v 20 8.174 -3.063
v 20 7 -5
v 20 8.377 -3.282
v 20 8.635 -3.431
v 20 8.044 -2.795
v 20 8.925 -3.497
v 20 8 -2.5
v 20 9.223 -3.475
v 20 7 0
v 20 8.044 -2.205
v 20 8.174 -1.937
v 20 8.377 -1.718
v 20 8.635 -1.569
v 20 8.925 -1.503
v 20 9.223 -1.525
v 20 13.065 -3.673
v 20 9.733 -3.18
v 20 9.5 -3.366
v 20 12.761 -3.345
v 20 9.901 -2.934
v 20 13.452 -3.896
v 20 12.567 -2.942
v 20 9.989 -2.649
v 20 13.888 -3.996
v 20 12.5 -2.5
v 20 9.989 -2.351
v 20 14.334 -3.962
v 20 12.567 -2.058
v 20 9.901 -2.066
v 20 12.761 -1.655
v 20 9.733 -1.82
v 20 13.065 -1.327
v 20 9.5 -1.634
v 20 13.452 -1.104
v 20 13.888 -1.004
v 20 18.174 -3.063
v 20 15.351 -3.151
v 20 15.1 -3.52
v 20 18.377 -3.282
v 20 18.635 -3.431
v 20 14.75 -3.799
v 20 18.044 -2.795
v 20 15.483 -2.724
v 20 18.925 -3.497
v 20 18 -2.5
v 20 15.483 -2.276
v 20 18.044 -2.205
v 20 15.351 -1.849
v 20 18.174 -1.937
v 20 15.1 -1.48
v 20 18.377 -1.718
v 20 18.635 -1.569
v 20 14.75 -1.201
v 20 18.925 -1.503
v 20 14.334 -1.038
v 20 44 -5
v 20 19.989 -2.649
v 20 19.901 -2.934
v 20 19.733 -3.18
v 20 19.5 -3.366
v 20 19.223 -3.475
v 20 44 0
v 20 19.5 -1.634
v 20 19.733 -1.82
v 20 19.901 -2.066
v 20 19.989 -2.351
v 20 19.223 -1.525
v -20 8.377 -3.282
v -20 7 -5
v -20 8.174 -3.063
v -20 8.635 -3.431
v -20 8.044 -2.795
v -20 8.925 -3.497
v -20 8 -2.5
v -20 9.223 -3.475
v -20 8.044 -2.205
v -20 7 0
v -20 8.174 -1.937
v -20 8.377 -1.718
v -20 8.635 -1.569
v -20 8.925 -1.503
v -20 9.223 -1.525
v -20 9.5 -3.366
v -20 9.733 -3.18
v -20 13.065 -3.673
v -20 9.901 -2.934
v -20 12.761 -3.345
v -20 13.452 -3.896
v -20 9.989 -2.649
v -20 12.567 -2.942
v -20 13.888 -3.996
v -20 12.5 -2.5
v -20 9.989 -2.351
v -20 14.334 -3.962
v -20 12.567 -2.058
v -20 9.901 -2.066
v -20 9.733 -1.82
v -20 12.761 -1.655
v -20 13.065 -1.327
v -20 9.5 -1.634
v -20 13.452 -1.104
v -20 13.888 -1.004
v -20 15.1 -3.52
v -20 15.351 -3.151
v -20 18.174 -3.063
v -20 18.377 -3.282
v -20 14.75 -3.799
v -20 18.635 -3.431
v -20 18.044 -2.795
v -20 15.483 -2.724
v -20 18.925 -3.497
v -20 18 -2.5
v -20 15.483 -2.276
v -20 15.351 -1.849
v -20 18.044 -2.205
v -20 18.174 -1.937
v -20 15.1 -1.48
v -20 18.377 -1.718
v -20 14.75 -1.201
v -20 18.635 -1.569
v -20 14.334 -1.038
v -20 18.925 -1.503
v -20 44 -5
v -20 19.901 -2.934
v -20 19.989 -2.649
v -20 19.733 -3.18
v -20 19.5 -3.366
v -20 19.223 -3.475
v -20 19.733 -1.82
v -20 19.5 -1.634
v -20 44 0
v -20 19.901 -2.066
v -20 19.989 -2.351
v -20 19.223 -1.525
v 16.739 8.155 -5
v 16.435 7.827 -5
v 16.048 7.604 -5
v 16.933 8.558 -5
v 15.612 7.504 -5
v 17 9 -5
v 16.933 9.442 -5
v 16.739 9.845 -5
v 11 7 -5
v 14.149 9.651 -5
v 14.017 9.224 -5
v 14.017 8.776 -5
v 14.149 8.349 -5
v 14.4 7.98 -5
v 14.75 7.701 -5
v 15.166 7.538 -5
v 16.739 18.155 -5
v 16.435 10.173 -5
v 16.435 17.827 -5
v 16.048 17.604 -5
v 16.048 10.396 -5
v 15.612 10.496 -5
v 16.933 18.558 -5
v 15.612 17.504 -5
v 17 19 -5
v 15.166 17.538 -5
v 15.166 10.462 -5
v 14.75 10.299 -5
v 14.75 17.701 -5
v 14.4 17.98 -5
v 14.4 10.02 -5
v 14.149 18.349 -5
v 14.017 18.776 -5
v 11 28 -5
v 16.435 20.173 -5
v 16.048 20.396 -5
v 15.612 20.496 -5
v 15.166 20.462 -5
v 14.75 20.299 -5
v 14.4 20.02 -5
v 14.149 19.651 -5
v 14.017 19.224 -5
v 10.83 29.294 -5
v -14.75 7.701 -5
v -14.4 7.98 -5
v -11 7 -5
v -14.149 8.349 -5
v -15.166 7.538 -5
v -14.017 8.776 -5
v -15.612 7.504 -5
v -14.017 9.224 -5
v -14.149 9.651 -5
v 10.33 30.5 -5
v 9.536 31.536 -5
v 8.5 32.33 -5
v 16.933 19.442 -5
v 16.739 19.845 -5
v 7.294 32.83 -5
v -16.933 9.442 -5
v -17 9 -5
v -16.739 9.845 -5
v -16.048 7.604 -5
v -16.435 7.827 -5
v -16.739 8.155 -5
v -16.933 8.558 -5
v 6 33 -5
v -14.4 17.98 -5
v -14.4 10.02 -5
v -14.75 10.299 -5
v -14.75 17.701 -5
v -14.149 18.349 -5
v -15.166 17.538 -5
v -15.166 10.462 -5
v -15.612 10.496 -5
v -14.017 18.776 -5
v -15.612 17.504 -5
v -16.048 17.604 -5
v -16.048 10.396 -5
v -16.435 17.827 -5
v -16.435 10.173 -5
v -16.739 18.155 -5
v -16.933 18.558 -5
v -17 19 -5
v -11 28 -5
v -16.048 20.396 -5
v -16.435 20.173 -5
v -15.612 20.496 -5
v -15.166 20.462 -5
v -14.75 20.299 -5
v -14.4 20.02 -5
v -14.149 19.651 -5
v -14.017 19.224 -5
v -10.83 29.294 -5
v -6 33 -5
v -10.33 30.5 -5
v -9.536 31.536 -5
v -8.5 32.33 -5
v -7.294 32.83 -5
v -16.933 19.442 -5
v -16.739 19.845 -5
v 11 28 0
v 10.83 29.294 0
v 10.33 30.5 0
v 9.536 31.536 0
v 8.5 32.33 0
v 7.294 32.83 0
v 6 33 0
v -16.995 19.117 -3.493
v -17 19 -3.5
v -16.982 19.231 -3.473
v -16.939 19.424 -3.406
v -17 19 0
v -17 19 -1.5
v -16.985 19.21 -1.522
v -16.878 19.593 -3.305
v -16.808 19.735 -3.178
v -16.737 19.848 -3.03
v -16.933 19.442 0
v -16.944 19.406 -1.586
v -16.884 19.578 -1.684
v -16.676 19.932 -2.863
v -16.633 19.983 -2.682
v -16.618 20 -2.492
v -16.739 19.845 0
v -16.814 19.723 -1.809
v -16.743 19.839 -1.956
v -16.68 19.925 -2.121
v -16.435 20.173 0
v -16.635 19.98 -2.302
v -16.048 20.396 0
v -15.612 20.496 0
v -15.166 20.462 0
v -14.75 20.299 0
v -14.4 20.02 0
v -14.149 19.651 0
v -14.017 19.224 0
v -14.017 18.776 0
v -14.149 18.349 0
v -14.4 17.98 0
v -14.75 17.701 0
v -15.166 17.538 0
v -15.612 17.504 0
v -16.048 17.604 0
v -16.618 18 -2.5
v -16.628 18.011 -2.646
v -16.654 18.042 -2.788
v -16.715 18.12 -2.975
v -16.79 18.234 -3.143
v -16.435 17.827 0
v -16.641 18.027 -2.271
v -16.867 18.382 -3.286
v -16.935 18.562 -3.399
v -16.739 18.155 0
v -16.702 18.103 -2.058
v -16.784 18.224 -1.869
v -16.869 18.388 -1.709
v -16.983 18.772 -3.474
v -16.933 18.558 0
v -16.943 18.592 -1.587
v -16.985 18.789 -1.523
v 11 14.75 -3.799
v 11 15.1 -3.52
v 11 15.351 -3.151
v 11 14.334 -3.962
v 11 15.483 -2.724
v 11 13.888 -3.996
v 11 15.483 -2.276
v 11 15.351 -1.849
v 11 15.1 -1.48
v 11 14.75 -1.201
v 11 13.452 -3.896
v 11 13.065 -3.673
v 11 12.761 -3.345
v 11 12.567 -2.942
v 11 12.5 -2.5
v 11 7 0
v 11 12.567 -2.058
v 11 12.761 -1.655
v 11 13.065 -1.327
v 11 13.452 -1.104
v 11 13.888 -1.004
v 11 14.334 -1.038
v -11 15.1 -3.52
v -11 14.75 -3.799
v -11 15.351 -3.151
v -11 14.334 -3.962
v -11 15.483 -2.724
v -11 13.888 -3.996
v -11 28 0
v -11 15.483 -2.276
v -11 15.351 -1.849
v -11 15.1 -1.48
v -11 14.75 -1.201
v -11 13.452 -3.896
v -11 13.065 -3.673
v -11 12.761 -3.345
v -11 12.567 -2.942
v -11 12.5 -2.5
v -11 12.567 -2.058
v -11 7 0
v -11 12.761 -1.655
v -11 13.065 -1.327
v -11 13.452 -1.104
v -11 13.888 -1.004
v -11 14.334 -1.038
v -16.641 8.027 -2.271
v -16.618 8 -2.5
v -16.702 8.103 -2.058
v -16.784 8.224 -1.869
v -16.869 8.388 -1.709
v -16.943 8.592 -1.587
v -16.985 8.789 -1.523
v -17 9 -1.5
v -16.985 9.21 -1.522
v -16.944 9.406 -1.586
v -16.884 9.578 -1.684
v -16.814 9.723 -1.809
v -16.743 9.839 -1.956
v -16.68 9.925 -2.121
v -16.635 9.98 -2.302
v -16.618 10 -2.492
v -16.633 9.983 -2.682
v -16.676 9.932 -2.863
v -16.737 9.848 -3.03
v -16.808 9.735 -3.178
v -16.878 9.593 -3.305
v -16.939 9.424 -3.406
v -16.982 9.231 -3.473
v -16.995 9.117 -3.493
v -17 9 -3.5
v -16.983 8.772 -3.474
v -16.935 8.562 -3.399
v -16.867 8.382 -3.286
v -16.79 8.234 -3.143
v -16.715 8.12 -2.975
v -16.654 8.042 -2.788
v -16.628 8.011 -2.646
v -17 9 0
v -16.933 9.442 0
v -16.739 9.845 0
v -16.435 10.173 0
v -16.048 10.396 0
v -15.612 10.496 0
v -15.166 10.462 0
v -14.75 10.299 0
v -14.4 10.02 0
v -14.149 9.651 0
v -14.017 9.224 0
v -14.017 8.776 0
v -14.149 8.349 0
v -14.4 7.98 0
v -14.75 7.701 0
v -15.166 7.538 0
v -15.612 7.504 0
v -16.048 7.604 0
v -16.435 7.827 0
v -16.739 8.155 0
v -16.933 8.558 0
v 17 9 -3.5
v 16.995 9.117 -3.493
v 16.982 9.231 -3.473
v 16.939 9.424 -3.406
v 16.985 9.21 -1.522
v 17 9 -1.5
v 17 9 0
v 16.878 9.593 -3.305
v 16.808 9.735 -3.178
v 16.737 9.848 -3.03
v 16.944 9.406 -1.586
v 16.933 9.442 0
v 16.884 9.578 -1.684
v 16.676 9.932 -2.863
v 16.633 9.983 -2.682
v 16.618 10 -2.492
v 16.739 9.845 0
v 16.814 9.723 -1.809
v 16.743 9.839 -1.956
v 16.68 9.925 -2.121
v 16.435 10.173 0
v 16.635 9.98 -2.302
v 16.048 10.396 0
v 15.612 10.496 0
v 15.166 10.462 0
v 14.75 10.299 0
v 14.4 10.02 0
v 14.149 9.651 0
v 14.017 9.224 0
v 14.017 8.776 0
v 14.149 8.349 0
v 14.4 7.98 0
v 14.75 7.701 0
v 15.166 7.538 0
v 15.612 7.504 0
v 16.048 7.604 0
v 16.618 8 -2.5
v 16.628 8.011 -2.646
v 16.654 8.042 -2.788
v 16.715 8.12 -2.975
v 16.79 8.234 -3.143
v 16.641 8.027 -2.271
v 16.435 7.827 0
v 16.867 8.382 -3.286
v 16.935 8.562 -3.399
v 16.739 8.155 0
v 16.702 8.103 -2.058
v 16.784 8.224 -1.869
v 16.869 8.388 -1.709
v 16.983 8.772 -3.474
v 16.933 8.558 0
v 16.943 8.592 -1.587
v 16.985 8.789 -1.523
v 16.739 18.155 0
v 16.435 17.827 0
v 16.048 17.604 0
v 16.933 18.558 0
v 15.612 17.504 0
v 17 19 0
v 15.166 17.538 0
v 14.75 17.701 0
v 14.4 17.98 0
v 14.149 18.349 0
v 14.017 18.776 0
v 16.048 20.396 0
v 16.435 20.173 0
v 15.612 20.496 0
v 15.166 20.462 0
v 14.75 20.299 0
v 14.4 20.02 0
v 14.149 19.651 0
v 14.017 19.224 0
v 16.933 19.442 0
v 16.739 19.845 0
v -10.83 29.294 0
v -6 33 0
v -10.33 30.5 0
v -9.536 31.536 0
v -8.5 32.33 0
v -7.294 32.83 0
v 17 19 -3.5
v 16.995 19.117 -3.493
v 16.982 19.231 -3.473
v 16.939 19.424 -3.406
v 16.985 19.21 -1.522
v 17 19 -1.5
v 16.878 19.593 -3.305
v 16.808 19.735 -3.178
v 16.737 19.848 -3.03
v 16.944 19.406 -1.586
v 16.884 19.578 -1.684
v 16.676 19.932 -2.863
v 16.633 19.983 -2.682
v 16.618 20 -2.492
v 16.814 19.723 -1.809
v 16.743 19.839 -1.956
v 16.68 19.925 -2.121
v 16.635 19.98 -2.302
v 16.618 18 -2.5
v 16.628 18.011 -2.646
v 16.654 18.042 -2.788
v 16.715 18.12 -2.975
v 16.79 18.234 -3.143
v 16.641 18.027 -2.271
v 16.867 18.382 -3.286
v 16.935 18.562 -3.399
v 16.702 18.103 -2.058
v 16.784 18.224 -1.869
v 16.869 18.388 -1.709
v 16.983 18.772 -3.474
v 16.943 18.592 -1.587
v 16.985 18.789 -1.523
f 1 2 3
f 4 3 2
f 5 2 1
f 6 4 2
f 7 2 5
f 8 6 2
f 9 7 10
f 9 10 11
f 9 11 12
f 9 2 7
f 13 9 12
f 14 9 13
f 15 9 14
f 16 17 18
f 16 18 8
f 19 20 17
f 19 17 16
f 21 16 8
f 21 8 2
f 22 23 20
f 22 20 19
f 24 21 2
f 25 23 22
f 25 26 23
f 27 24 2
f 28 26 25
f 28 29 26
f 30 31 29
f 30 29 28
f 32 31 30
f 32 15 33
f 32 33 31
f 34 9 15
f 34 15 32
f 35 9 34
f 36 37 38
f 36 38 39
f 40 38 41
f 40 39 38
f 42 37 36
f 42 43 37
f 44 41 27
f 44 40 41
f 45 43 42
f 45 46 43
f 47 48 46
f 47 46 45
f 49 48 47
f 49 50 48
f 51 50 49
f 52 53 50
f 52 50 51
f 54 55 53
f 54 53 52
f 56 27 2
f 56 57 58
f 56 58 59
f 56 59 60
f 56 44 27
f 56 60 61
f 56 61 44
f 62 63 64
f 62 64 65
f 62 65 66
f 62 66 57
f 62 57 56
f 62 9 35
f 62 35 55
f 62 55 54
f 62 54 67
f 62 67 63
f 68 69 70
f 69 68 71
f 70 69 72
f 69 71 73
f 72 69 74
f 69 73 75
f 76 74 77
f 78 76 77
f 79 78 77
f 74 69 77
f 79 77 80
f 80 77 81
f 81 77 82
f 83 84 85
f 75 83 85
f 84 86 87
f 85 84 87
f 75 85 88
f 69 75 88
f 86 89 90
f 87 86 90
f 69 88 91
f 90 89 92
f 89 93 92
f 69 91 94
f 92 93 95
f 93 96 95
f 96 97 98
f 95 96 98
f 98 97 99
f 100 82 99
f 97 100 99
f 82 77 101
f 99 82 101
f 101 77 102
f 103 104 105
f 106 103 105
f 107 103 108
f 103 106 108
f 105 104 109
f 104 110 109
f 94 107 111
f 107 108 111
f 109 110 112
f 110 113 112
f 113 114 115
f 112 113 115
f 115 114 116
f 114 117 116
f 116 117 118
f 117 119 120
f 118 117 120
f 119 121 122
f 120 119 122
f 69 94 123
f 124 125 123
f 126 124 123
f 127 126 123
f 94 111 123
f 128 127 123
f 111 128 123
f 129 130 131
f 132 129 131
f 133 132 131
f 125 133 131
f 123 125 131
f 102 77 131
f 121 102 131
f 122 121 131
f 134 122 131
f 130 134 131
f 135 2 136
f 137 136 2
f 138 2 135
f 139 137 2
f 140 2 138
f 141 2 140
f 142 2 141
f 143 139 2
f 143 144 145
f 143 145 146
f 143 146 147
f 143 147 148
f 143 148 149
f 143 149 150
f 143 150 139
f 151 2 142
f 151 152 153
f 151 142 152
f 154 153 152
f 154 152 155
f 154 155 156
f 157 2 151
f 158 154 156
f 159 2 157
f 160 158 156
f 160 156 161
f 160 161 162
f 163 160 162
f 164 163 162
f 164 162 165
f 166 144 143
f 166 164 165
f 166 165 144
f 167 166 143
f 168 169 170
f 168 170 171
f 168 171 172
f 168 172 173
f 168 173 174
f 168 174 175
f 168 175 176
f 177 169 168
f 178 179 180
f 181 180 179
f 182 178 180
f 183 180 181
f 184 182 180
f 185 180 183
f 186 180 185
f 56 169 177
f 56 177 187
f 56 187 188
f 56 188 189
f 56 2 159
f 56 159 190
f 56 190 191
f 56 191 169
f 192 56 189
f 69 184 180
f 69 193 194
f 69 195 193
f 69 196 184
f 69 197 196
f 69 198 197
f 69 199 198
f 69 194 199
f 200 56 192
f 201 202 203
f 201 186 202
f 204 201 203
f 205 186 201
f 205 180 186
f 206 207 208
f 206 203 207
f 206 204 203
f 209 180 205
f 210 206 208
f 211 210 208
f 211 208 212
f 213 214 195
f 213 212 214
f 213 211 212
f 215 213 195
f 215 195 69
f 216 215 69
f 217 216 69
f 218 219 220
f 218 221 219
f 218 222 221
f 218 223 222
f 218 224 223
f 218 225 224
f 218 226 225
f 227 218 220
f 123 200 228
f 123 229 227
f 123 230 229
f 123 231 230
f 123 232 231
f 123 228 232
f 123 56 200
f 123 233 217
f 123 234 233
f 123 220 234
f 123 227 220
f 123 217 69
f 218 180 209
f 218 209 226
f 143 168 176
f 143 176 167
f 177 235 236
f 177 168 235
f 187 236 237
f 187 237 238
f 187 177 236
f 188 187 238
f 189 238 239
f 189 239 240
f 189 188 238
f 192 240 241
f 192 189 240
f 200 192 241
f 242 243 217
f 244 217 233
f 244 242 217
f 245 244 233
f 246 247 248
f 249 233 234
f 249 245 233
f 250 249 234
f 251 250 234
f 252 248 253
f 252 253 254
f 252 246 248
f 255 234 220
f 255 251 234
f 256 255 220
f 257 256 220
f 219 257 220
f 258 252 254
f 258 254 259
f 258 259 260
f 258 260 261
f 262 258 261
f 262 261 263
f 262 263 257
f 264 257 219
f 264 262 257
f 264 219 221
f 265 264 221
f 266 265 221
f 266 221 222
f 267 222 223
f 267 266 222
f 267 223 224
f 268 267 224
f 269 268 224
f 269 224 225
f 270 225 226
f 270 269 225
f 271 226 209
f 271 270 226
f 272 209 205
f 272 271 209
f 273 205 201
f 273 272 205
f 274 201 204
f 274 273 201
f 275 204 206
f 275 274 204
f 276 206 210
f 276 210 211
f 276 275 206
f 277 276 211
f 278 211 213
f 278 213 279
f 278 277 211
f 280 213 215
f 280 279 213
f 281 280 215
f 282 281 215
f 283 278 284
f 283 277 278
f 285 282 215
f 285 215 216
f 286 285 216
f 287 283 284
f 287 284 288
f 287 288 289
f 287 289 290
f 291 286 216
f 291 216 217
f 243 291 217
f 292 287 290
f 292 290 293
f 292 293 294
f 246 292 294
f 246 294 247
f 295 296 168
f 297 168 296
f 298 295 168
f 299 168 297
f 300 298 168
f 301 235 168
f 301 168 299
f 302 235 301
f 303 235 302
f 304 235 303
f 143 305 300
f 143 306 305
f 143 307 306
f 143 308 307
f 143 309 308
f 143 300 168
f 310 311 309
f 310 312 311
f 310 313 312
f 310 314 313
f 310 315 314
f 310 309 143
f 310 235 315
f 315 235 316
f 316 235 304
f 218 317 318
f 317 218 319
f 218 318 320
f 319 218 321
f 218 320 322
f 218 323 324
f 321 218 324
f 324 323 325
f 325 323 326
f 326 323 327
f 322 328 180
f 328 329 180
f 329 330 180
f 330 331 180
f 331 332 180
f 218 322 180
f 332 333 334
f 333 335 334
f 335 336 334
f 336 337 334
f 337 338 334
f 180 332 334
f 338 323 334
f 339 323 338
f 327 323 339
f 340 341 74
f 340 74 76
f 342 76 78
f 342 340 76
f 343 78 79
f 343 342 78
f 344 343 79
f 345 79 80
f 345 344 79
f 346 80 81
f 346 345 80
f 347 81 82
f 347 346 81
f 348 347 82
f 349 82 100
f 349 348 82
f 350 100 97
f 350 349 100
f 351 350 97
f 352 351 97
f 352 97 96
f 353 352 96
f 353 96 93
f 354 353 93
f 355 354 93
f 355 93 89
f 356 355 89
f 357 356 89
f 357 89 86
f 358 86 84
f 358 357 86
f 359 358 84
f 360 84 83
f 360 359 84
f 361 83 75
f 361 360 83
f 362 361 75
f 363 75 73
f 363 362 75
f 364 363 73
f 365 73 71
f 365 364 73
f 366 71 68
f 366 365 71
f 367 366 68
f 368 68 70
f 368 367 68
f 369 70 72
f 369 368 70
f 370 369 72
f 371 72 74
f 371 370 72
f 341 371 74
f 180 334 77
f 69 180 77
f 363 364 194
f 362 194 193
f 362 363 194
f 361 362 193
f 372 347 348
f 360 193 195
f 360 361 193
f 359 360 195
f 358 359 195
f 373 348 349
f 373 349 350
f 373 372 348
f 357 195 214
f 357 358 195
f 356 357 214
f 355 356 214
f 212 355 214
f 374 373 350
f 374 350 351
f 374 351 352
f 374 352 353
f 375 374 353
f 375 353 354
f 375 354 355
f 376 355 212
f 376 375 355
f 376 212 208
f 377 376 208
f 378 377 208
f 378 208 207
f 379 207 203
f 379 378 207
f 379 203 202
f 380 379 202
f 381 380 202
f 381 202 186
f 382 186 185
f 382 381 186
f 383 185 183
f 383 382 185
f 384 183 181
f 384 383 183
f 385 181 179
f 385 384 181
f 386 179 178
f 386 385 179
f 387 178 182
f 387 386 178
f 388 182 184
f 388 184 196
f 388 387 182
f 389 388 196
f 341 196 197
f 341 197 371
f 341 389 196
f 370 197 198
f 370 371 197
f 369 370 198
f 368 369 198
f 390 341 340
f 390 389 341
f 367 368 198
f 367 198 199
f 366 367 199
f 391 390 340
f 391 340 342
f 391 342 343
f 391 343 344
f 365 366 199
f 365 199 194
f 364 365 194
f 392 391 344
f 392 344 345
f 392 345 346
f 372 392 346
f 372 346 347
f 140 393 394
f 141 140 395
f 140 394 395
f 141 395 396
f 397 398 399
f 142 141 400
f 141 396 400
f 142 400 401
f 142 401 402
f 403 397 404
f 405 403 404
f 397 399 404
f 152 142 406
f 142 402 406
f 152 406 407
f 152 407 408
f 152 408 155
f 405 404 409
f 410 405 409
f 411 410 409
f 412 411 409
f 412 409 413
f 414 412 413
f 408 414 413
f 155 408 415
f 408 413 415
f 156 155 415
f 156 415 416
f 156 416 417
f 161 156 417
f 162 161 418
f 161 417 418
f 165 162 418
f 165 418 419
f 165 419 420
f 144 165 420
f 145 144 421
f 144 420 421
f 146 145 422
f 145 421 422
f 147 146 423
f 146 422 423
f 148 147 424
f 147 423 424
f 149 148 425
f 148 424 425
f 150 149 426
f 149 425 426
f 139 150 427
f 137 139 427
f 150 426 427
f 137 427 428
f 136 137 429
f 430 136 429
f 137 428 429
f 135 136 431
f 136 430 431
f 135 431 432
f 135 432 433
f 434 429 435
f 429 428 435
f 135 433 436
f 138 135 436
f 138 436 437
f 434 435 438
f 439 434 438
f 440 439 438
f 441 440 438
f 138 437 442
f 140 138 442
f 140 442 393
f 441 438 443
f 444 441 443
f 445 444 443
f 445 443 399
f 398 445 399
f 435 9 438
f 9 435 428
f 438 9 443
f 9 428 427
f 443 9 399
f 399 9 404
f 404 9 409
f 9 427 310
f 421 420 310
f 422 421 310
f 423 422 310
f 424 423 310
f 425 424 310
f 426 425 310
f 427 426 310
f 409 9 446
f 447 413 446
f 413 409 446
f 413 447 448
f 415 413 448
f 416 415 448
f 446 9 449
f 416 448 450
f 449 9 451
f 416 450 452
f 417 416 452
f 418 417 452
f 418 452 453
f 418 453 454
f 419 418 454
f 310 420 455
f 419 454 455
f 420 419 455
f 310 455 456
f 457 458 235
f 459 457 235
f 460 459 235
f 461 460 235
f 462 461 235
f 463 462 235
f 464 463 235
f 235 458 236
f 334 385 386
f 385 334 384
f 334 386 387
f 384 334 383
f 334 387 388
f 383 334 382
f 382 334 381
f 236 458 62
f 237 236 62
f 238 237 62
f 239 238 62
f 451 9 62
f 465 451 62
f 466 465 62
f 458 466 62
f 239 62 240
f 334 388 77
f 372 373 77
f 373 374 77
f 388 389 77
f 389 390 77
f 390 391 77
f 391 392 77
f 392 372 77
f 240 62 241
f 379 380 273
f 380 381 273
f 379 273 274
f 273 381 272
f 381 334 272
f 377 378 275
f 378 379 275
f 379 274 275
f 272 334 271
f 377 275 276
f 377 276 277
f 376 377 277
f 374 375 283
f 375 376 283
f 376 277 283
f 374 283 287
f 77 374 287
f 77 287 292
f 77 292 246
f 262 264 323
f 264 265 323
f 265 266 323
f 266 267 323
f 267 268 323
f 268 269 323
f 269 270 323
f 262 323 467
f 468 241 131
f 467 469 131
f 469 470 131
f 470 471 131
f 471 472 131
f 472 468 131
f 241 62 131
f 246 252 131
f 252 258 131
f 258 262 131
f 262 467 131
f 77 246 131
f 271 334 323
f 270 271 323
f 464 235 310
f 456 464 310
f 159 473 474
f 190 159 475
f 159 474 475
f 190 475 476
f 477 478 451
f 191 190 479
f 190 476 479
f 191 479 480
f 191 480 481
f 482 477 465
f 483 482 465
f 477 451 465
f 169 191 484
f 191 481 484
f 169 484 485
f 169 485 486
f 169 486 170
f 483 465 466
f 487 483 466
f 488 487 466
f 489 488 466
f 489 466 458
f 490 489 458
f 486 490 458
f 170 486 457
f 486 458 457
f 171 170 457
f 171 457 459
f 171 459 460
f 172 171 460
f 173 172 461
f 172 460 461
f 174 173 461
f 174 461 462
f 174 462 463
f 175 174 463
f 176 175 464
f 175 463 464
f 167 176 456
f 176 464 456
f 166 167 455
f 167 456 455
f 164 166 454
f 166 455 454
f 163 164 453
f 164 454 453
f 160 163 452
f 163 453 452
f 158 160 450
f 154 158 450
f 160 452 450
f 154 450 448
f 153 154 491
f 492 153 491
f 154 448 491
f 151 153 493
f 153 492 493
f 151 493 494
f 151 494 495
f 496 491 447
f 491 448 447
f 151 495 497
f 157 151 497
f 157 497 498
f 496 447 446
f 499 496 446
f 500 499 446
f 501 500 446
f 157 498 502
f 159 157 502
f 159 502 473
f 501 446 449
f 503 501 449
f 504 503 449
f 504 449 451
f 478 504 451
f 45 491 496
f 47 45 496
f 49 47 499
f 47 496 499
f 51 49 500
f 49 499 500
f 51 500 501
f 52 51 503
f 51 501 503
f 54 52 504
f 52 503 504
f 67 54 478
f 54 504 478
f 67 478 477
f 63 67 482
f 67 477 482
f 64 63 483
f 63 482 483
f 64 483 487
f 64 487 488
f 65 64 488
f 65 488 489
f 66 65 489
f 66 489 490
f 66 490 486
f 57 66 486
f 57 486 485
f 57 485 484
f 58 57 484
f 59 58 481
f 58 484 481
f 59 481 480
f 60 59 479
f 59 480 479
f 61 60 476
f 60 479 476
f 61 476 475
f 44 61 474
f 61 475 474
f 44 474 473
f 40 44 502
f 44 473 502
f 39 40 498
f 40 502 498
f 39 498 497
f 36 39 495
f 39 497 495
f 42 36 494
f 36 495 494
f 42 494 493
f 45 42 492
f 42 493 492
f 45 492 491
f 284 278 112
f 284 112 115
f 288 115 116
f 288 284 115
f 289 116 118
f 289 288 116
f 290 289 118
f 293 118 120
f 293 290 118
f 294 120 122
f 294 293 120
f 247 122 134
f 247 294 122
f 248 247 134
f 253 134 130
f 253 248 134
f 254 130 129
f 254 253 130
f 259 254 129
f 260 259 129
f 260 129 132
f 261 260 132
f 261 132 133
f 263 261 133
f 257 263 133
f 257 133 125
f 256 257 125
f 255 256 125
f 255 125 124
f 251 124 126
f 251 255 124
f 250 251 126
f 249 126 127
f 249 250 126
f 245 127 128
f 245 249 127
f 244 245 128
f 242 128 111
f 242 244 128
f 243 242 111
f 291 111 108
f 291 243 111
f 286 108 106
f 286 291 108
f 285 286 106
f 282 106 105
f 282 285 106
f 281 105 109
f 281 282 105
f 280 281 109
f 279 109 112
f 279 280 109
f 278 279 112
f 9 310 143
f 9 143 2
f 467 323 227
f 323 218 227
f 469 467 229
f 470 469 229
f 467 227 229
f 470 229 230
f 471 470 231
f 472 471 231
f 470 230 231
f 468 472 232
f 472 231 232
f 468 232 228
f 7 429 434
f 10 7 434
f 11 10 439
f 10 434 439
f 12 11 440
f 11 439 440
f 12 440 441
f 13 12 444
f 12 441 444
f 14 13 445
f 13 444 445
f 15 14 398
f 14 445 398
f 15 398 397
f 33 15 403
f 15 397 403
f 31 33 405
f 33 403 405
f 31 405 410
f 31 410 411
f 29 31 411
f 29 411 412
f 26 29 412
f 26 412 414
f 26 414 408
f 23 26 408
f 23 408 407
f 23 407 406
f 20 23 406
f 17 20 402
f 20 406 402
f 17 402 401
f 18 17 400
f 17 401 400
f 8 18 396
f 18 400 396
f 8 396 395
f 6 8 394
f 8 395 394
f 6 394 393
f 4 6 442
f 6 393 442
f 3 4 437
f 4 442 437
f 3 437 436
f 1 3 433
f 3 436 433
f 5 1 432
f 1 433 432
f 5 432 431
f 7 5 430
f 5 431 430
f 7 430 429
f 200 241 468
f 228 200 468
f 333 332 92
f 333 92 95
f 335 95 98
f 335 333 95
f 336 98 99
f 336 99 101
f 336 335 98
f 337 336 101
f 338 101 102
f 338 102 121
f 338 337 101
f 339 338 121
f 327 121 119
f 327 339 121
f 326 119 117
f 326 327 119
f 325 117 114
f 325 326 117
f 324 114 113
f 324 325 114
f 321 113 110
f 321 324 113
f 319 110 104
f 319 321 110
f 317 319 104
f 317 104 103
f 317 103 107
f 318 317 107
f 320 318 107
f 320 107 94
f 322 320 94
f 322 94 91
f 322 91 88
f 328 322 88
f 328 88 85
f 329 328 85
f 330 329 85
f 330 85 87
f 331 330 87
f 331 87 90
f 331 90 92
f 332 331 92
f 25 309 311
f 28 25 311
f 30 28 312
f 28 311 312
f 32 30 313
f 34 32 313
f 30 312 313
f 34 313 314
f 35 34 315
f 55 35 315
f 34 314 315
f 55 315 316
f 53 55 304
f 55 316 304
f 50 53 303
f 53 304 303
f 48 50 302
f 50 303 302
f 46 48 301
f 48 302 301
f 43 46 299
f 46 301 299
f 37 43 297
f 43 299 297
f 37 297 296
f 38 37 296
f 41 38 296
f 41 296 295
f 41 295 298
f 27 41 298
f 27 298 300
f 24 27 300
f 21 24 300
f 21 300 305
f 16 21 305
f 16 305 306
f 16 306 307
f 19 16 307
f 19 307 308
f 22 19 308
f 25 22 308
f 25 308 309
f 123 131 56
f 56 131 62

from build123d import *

# Parameters (mm, degrees)
F0_R     = 1.5
F1_DEPTH = 5
F3_D     = 2
F3_DEPTH = 5
F3_TIP   = 0.600860619
F4_R     = 5
F5_D     = 3


# Not quite as in the source:
# - a feature names something its author has since deleted; it is built from what else it names


with BuildPart() as f1:
    # F0 (on Top) → F1 (new body)
    with BuildSketch(Plane.XY):
        Polygon((11, 33), (11, 7), (20, 7), (20, 44), (0, 44), (0, 33), align=None)
        with Locations((15.5, 9)):
            Circle(F0_R, mode=Mode.SUBTRACT)
        with Locations((15.5, 19)):
            Circle(F0_R, mode=Mode.SUBTRACT)
    extrude(amount=-F1_DEPTH)

    # F3
    with Locations(Plane.YZ.offset(20)):
        with Locations((9, -2.5), (19, -2.5)):
            Hole(F3_D / 2, depth=F3_DEPTH)
            with Locations((0, 0, -(F3_DEPTH + F3_TIP / 2))):  # 118° drill point
                Cone(0, F3_D / 2, F3_TIP, mode=Mode.SUBTRACT)

    # F4
    f4_edges = [f1.edges().sort_by_distance(p)[0] for p in [
        (11, 33, -2.5),
    ]]
    fillet(f4_edges, radius=F4_R)

    # F5 (through all)
    with Locations(Plane.YZ.offset(20)):
        with Locations((14, -2.5)):
            Hole(F5_D / 2)

    # F6: F1 across plane


with BuildPart() as f1_1:
    add(f1.part)
    add(f1.part.mirror(Plane.YZ))


solid = f1_1.part
